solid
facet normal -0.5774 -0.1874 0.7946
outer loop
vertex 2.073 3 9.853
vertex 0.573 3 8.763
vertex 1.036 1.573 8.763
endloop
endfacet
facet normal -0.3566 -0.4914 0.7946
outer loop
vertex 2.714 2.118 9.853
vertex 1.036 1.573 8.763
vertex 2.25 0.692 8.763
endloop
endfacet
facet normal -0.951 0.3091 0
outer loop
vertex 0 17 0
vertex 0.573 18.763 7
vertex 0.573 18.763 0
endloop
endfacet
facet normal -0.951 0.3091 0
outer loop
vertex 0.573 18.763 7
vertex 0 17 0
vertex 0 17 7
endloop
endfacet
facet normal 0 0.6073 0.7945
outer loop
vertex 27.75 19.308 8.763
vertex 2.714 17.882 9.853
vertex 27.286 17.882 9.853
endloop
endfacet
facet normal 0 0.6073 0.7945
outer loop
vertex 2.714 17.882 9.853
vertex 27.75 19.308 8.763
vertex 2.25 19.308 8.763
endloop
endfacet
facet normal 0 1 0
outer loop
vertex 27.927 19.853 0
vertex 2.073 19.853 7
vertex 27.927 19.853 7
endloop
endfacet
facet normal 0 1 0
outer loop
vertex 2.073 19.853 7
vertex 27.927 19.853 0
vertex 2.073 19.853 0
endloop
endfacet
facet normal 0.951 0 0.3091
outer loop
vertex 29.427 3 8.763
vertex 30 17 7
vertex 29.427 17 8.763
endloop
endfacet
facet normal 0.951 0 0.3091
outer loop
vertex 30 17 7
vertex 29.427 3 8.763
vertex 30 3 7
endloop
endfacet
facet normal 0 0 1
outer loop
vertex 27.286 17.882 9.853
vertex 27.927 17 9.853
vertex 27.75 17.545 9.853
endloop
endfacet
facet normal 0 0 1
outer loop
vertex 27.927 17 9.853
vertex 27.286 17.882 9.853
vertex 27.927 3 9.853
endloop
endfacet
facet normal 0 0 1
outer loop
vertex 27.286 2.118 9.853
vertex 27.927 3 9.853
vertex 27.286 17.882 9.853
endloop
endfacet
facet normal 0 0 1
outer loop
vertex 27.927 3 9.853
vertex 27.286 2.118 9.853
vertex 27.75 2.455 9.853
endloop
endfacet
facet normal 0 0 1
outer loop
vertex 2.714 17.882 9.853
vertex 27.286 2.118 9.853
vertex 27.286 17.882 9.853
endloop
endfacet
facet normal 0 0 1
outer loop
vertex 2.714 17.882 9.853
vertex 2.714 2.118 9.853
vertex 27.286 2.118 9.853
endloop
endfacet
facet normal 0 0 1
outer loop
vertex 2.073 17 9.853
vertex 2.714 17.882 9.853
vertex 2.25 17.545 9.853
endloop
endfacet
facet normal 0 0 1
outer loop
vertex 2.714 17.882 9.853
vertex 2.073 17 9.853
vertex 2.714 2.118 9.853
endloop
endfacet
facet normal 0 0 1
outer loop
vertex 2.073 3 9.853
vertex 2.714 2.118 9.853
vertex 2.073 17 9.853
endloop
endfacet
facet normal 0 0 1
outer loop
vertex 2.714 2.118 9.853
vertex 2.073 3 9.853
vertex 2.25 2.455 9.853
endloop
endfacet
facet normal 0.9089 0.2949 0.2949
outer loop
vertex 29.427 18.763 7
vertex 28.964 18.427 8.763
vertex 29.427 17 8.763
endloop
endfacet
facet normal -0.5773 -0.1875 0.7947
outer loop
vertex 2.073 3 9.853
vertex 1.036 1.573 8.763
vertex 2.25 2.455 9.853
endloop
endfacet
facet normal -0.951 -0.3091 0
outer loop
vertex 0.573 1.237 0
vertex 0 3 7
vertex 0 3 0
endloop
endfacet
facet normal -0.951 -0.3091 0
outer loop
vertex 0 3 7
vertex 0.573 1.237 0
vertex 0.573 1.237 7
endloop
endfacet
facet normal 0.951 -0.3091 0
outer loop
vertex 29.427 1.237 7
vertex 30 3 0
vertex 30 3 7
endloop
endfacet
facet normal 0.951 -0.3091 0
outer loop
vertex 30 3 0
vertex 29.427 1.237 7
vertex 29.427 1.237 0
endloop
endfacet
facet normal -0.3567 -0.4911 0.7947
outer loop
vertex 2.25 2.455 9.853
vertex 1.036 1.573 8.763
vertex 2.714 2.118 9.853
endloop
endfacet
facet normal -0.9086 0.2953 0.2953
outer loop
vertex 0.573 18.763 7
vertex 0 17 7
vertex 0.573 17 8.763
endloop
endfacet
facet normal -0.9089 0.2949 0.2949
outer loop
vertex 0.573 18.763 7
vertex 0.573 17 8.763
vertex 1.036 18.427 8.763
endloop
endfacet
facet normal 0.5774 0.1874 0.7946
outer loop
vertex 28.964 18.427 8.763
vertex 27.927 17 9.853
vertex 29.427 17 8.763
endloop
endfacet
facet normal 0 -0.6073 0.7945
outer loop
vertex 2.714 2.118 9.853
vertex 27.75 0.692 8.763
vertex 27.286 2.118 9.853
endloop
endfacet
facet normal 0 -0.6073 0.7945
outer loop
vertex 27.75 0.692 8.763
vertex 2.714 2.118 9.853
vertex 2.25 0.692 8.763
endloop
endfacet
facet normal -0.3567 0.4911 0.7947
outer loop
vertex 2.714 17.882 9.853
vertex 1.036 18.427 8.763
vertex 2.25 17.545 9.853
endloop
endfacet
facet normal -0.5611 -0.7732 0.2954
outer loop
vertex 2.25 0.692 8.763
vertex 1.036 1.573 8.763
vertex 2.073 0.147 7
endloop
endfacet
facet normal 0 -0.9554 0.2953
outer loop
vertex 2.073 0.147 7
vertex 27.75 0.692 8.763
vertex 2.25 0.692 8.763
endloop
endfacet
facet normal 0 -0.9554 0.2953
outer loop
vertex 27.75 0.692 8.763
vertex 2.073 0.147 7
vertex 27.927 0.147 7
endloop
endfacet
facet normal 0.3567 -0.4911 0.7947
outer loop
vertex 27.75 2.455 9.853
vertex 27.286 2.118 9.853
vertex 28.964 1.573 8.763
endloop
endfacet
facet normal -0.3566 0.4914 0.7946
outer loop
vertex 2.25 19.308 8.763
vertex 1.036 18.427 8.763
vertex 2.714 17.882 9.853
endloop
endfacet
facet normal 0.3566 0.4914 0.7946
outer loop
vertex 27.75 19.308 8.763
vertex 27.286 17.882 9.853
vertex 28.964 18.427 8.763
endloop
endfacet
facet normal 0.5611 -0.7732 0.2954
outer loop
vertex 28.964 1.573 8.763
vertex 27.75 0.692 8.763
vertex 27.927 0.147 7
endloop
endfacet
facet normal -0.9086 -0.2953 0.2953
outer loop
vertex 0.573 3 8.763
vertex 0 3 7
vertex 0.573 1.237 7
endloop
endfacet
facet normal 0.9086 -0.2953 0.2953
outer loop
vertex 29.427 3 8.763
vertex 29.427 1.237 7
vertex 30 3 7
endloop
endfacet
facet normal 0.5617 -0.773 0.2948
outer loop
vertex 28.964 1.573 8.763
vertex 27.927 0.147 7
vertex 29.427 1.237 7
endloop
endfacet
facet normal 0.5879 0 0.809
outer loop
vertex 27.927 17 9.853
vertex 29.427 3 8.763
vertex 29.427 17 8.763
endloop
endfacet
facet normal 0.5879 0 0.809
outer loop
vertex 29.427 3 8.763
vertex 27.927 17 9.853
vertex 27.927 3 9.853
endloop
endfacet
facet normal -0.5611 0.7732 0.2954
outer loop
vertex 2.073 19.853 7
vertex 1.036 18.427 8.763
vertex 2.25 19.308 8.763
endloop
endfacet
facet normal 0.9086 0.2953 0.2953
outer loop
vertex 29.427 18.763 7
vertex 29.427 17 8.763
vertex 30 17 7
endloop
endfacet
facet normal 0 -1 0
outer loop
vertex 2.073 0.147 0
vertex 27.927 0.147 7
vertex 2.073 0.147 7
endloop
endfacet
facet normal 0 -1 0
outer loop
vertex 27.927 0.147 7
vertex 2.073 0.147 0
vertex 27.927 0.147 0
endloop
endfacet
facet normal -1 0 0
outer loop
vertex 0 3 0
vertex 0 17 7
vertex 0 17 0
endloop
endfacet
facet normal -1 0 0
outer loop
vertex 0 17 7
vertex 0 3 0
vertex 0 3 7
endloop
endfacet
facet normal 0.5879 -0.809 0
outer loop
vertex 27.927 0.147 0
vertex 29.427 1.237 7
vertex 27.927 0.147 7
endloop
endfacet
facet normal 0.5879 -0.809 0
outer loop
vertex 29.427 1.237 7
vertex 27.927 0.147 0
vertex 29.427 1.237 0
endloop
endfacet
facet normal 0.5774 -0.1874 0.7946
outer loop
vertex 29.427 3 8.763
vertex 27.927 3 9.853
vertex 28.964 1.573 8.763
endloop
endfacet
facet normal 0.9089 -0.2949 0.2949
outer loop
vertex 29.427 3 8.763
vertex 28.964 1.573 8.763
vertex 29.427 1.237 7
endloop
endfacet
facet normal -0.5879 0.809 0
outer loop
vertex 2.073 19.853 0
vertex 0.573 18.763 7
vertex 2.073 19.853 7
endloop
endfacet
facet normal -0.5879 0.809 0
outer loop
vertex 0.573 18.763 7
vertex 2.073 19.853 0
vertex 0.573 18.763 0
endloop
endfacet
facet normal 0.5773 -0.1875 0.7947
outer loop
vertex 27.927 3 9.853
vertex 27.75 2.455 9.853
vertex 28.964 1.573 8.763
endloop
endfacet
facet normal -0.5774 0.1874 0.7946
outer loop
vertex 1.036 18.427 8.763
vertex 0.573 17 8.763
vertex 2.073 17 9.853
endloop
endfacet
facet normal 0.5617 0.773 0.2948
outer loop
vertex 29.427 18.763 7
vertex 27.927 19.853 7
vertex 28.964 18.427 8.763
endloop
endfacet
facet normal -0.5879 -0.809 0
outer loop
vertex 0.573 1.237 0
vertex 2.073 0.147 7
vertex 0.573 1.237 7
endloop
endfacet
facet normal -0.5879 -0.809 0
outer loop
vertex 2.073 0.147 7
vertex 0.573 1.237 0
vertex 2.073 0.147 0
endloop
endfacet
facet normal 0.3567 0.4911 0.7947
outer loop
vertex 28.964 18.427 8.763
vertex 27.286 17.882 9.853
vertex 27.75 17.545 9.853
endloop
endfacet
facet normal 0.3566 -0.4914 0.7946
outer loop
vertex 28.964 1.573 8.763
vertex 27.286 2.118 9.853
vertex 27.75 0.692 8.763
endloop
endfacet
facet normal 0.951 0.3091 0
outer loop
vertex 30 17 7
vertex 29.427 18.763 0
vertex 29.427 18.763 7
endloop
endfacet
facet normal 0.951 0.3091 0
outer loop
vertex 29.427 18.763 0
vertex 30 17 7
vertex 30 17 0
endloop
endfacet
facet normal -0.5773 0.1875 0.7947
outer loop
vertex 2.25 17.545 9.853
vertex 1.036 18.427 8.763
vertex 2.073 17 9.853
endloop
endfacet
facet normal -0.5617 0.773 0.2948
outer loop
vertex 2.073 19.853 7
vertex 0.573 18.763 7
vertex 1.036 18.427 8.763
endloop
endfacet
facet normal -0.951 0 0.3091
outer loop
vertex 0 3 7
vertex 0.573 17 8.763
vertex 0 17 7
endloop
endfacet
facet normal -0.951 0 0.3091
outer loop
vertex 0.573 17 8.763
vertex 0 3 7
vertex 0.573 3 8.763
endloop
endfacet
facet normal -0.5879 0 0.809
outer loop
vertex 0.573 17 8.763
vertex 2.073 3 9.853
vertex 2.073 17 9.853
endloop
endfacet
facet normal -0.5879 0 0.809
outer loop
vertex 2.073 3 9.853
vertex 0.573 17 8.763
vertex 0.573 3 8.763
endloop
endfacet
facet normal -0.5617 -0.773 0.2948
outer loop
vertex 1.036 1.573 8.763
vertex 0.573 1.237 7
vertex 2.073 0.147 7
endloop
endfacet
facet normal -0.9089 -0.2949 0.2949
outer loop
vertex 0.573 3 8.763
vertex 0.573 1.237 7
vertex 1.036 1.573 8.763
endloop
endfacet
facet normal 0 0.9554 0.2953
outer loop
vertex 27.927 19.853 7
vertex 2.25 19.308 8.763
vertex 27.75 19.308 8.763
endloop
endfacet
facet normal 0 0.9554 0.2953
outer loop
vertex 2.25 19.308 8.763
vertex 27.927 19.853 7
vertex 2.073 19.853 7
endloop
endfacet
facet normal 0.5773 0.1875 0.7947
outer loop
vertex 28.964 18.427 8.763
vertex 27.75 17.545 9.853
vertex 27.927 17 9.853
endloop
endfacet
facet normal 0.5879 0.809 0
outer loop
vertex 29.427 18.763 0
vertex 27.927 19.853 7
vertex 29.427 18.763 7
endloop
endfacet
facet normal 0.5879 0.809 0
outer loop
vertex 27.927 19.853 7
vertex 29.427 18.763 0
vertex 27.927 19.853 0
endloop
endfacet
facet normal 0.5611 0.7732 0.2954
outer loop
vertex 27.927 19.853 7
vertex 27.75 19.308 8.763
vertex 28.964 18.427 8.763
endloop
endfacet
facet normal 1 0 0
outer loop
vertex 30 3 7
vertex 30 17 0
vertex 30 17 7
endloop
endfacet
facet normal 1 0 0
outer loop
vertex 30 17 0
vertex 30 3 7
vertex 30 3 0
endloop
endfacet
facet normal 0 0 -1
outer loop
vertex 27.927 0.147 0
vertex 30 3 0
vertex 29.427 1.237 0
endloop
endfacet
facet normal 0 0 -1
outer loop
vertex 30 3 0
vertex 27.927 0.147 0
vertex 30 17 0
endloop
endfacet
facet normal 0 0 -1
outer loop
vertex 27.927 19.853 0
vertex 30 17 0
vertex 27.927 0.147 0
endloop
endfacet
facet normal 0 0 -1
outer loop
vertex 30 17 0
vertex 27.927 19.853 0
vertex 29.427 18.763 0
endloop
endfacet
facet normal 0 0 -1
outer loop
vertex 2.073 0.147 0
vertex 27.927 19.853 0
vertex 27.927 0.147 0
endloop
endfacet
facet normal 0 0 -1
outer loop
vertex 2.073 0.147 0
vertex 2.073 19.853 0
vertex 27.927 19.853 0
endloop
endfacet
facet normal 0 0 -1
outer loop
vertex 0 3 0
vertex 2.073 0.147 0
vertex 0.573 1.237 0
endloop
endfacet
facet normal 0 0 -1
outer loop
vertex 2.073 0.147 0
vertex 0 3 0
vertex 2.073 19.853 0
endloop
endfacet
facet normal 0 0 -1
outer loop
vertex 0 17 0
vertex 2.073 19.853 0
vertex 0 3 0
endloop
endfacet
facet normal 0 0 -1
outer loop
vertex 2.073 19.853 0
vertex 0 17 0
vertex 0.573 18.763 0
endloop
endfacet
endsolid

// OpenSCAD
// Example:
roundedCube(
  x = 30,
  y = 20,
  z = 10,
  r = 3,
  flatBottom = true
);

module roundedCube(
  x,
  y,
  z,
  r = 0,
  flatTop = false,
  flatBottom = false,
  flatLeft = false,
  flatRight = false,
  flatFront = false,
  flatBack = false
) {

  // Calculate [ x, y, z ] compensations based on requested roundings:
  rX = r * (flatLeft && flatRight ? 0 : (flatLeft || flatRight ? 1 : 2));
  rY = r * (flatFront && flatBack ? 0 : (flatFront || flatBack ? 1 : 2));
  rZ = r * (flatTop && flatBottom ? 0 : (flatTop || flatBottom ? 1 : 2));

  // Do some sanity checks:
  if (x - rX <= 0) {
    echo("<b style='color: red'>WARNING</b>: roundedCube() is too small along its x-axis");
  }
  if (y - rY <= 0) {
    echo("<b style='color: red'>WARNING</b>: roundedCube() is too small along its y-axis");
  }
  if (z - rZ <= 0) {
    echo("<b style='color: red'>WARNING</b>: roundedCube() is too small along its z-axis");
  }

  difference() {

    // Main rounded cube:
    translate([
      flatLeft ? 0 : r,
      flatFront ? 0 : r,
      flatBottom ? 0 : r
    ]) {
      minkowski() {
        cube([
          x - rX,
          y - rY,
          z - rZ
        ]);
        sphere(r = r);
      }
    }

    // Optional cutouts:
    // (let's not generate unnecessary geometry)
    if (flatTop) {
      translate([ x / -2, y / -2, z ])
      cube([ x * 2, y * 2, z ]);
    }
    if (flatBottom) {
      translate([ x / -2, y / -2, -z ])
      cube([ x * 2, y * 2, z ]);
    }
    if (flatLeft) {
      translate([ -x, y / -2, z / -2 ])
      cube([ x, y * 2, z * 2 ]);
    }
    if (flatRight) {
      translate([ x, y / -2, z / -2 ])
      cube([ x, y * 2, z * 2 ]);
    }
    if (flatFront) {
      translate([ x / -2, -y, z / -2 ])
      cube([ x * 2, y, z * 2 ]);
    }
    if (flatBack) {
      translate([ x / -2, y, z / -2 ])
      cube([ x * 2, y, z * 2 ]);
    }

  }

}
